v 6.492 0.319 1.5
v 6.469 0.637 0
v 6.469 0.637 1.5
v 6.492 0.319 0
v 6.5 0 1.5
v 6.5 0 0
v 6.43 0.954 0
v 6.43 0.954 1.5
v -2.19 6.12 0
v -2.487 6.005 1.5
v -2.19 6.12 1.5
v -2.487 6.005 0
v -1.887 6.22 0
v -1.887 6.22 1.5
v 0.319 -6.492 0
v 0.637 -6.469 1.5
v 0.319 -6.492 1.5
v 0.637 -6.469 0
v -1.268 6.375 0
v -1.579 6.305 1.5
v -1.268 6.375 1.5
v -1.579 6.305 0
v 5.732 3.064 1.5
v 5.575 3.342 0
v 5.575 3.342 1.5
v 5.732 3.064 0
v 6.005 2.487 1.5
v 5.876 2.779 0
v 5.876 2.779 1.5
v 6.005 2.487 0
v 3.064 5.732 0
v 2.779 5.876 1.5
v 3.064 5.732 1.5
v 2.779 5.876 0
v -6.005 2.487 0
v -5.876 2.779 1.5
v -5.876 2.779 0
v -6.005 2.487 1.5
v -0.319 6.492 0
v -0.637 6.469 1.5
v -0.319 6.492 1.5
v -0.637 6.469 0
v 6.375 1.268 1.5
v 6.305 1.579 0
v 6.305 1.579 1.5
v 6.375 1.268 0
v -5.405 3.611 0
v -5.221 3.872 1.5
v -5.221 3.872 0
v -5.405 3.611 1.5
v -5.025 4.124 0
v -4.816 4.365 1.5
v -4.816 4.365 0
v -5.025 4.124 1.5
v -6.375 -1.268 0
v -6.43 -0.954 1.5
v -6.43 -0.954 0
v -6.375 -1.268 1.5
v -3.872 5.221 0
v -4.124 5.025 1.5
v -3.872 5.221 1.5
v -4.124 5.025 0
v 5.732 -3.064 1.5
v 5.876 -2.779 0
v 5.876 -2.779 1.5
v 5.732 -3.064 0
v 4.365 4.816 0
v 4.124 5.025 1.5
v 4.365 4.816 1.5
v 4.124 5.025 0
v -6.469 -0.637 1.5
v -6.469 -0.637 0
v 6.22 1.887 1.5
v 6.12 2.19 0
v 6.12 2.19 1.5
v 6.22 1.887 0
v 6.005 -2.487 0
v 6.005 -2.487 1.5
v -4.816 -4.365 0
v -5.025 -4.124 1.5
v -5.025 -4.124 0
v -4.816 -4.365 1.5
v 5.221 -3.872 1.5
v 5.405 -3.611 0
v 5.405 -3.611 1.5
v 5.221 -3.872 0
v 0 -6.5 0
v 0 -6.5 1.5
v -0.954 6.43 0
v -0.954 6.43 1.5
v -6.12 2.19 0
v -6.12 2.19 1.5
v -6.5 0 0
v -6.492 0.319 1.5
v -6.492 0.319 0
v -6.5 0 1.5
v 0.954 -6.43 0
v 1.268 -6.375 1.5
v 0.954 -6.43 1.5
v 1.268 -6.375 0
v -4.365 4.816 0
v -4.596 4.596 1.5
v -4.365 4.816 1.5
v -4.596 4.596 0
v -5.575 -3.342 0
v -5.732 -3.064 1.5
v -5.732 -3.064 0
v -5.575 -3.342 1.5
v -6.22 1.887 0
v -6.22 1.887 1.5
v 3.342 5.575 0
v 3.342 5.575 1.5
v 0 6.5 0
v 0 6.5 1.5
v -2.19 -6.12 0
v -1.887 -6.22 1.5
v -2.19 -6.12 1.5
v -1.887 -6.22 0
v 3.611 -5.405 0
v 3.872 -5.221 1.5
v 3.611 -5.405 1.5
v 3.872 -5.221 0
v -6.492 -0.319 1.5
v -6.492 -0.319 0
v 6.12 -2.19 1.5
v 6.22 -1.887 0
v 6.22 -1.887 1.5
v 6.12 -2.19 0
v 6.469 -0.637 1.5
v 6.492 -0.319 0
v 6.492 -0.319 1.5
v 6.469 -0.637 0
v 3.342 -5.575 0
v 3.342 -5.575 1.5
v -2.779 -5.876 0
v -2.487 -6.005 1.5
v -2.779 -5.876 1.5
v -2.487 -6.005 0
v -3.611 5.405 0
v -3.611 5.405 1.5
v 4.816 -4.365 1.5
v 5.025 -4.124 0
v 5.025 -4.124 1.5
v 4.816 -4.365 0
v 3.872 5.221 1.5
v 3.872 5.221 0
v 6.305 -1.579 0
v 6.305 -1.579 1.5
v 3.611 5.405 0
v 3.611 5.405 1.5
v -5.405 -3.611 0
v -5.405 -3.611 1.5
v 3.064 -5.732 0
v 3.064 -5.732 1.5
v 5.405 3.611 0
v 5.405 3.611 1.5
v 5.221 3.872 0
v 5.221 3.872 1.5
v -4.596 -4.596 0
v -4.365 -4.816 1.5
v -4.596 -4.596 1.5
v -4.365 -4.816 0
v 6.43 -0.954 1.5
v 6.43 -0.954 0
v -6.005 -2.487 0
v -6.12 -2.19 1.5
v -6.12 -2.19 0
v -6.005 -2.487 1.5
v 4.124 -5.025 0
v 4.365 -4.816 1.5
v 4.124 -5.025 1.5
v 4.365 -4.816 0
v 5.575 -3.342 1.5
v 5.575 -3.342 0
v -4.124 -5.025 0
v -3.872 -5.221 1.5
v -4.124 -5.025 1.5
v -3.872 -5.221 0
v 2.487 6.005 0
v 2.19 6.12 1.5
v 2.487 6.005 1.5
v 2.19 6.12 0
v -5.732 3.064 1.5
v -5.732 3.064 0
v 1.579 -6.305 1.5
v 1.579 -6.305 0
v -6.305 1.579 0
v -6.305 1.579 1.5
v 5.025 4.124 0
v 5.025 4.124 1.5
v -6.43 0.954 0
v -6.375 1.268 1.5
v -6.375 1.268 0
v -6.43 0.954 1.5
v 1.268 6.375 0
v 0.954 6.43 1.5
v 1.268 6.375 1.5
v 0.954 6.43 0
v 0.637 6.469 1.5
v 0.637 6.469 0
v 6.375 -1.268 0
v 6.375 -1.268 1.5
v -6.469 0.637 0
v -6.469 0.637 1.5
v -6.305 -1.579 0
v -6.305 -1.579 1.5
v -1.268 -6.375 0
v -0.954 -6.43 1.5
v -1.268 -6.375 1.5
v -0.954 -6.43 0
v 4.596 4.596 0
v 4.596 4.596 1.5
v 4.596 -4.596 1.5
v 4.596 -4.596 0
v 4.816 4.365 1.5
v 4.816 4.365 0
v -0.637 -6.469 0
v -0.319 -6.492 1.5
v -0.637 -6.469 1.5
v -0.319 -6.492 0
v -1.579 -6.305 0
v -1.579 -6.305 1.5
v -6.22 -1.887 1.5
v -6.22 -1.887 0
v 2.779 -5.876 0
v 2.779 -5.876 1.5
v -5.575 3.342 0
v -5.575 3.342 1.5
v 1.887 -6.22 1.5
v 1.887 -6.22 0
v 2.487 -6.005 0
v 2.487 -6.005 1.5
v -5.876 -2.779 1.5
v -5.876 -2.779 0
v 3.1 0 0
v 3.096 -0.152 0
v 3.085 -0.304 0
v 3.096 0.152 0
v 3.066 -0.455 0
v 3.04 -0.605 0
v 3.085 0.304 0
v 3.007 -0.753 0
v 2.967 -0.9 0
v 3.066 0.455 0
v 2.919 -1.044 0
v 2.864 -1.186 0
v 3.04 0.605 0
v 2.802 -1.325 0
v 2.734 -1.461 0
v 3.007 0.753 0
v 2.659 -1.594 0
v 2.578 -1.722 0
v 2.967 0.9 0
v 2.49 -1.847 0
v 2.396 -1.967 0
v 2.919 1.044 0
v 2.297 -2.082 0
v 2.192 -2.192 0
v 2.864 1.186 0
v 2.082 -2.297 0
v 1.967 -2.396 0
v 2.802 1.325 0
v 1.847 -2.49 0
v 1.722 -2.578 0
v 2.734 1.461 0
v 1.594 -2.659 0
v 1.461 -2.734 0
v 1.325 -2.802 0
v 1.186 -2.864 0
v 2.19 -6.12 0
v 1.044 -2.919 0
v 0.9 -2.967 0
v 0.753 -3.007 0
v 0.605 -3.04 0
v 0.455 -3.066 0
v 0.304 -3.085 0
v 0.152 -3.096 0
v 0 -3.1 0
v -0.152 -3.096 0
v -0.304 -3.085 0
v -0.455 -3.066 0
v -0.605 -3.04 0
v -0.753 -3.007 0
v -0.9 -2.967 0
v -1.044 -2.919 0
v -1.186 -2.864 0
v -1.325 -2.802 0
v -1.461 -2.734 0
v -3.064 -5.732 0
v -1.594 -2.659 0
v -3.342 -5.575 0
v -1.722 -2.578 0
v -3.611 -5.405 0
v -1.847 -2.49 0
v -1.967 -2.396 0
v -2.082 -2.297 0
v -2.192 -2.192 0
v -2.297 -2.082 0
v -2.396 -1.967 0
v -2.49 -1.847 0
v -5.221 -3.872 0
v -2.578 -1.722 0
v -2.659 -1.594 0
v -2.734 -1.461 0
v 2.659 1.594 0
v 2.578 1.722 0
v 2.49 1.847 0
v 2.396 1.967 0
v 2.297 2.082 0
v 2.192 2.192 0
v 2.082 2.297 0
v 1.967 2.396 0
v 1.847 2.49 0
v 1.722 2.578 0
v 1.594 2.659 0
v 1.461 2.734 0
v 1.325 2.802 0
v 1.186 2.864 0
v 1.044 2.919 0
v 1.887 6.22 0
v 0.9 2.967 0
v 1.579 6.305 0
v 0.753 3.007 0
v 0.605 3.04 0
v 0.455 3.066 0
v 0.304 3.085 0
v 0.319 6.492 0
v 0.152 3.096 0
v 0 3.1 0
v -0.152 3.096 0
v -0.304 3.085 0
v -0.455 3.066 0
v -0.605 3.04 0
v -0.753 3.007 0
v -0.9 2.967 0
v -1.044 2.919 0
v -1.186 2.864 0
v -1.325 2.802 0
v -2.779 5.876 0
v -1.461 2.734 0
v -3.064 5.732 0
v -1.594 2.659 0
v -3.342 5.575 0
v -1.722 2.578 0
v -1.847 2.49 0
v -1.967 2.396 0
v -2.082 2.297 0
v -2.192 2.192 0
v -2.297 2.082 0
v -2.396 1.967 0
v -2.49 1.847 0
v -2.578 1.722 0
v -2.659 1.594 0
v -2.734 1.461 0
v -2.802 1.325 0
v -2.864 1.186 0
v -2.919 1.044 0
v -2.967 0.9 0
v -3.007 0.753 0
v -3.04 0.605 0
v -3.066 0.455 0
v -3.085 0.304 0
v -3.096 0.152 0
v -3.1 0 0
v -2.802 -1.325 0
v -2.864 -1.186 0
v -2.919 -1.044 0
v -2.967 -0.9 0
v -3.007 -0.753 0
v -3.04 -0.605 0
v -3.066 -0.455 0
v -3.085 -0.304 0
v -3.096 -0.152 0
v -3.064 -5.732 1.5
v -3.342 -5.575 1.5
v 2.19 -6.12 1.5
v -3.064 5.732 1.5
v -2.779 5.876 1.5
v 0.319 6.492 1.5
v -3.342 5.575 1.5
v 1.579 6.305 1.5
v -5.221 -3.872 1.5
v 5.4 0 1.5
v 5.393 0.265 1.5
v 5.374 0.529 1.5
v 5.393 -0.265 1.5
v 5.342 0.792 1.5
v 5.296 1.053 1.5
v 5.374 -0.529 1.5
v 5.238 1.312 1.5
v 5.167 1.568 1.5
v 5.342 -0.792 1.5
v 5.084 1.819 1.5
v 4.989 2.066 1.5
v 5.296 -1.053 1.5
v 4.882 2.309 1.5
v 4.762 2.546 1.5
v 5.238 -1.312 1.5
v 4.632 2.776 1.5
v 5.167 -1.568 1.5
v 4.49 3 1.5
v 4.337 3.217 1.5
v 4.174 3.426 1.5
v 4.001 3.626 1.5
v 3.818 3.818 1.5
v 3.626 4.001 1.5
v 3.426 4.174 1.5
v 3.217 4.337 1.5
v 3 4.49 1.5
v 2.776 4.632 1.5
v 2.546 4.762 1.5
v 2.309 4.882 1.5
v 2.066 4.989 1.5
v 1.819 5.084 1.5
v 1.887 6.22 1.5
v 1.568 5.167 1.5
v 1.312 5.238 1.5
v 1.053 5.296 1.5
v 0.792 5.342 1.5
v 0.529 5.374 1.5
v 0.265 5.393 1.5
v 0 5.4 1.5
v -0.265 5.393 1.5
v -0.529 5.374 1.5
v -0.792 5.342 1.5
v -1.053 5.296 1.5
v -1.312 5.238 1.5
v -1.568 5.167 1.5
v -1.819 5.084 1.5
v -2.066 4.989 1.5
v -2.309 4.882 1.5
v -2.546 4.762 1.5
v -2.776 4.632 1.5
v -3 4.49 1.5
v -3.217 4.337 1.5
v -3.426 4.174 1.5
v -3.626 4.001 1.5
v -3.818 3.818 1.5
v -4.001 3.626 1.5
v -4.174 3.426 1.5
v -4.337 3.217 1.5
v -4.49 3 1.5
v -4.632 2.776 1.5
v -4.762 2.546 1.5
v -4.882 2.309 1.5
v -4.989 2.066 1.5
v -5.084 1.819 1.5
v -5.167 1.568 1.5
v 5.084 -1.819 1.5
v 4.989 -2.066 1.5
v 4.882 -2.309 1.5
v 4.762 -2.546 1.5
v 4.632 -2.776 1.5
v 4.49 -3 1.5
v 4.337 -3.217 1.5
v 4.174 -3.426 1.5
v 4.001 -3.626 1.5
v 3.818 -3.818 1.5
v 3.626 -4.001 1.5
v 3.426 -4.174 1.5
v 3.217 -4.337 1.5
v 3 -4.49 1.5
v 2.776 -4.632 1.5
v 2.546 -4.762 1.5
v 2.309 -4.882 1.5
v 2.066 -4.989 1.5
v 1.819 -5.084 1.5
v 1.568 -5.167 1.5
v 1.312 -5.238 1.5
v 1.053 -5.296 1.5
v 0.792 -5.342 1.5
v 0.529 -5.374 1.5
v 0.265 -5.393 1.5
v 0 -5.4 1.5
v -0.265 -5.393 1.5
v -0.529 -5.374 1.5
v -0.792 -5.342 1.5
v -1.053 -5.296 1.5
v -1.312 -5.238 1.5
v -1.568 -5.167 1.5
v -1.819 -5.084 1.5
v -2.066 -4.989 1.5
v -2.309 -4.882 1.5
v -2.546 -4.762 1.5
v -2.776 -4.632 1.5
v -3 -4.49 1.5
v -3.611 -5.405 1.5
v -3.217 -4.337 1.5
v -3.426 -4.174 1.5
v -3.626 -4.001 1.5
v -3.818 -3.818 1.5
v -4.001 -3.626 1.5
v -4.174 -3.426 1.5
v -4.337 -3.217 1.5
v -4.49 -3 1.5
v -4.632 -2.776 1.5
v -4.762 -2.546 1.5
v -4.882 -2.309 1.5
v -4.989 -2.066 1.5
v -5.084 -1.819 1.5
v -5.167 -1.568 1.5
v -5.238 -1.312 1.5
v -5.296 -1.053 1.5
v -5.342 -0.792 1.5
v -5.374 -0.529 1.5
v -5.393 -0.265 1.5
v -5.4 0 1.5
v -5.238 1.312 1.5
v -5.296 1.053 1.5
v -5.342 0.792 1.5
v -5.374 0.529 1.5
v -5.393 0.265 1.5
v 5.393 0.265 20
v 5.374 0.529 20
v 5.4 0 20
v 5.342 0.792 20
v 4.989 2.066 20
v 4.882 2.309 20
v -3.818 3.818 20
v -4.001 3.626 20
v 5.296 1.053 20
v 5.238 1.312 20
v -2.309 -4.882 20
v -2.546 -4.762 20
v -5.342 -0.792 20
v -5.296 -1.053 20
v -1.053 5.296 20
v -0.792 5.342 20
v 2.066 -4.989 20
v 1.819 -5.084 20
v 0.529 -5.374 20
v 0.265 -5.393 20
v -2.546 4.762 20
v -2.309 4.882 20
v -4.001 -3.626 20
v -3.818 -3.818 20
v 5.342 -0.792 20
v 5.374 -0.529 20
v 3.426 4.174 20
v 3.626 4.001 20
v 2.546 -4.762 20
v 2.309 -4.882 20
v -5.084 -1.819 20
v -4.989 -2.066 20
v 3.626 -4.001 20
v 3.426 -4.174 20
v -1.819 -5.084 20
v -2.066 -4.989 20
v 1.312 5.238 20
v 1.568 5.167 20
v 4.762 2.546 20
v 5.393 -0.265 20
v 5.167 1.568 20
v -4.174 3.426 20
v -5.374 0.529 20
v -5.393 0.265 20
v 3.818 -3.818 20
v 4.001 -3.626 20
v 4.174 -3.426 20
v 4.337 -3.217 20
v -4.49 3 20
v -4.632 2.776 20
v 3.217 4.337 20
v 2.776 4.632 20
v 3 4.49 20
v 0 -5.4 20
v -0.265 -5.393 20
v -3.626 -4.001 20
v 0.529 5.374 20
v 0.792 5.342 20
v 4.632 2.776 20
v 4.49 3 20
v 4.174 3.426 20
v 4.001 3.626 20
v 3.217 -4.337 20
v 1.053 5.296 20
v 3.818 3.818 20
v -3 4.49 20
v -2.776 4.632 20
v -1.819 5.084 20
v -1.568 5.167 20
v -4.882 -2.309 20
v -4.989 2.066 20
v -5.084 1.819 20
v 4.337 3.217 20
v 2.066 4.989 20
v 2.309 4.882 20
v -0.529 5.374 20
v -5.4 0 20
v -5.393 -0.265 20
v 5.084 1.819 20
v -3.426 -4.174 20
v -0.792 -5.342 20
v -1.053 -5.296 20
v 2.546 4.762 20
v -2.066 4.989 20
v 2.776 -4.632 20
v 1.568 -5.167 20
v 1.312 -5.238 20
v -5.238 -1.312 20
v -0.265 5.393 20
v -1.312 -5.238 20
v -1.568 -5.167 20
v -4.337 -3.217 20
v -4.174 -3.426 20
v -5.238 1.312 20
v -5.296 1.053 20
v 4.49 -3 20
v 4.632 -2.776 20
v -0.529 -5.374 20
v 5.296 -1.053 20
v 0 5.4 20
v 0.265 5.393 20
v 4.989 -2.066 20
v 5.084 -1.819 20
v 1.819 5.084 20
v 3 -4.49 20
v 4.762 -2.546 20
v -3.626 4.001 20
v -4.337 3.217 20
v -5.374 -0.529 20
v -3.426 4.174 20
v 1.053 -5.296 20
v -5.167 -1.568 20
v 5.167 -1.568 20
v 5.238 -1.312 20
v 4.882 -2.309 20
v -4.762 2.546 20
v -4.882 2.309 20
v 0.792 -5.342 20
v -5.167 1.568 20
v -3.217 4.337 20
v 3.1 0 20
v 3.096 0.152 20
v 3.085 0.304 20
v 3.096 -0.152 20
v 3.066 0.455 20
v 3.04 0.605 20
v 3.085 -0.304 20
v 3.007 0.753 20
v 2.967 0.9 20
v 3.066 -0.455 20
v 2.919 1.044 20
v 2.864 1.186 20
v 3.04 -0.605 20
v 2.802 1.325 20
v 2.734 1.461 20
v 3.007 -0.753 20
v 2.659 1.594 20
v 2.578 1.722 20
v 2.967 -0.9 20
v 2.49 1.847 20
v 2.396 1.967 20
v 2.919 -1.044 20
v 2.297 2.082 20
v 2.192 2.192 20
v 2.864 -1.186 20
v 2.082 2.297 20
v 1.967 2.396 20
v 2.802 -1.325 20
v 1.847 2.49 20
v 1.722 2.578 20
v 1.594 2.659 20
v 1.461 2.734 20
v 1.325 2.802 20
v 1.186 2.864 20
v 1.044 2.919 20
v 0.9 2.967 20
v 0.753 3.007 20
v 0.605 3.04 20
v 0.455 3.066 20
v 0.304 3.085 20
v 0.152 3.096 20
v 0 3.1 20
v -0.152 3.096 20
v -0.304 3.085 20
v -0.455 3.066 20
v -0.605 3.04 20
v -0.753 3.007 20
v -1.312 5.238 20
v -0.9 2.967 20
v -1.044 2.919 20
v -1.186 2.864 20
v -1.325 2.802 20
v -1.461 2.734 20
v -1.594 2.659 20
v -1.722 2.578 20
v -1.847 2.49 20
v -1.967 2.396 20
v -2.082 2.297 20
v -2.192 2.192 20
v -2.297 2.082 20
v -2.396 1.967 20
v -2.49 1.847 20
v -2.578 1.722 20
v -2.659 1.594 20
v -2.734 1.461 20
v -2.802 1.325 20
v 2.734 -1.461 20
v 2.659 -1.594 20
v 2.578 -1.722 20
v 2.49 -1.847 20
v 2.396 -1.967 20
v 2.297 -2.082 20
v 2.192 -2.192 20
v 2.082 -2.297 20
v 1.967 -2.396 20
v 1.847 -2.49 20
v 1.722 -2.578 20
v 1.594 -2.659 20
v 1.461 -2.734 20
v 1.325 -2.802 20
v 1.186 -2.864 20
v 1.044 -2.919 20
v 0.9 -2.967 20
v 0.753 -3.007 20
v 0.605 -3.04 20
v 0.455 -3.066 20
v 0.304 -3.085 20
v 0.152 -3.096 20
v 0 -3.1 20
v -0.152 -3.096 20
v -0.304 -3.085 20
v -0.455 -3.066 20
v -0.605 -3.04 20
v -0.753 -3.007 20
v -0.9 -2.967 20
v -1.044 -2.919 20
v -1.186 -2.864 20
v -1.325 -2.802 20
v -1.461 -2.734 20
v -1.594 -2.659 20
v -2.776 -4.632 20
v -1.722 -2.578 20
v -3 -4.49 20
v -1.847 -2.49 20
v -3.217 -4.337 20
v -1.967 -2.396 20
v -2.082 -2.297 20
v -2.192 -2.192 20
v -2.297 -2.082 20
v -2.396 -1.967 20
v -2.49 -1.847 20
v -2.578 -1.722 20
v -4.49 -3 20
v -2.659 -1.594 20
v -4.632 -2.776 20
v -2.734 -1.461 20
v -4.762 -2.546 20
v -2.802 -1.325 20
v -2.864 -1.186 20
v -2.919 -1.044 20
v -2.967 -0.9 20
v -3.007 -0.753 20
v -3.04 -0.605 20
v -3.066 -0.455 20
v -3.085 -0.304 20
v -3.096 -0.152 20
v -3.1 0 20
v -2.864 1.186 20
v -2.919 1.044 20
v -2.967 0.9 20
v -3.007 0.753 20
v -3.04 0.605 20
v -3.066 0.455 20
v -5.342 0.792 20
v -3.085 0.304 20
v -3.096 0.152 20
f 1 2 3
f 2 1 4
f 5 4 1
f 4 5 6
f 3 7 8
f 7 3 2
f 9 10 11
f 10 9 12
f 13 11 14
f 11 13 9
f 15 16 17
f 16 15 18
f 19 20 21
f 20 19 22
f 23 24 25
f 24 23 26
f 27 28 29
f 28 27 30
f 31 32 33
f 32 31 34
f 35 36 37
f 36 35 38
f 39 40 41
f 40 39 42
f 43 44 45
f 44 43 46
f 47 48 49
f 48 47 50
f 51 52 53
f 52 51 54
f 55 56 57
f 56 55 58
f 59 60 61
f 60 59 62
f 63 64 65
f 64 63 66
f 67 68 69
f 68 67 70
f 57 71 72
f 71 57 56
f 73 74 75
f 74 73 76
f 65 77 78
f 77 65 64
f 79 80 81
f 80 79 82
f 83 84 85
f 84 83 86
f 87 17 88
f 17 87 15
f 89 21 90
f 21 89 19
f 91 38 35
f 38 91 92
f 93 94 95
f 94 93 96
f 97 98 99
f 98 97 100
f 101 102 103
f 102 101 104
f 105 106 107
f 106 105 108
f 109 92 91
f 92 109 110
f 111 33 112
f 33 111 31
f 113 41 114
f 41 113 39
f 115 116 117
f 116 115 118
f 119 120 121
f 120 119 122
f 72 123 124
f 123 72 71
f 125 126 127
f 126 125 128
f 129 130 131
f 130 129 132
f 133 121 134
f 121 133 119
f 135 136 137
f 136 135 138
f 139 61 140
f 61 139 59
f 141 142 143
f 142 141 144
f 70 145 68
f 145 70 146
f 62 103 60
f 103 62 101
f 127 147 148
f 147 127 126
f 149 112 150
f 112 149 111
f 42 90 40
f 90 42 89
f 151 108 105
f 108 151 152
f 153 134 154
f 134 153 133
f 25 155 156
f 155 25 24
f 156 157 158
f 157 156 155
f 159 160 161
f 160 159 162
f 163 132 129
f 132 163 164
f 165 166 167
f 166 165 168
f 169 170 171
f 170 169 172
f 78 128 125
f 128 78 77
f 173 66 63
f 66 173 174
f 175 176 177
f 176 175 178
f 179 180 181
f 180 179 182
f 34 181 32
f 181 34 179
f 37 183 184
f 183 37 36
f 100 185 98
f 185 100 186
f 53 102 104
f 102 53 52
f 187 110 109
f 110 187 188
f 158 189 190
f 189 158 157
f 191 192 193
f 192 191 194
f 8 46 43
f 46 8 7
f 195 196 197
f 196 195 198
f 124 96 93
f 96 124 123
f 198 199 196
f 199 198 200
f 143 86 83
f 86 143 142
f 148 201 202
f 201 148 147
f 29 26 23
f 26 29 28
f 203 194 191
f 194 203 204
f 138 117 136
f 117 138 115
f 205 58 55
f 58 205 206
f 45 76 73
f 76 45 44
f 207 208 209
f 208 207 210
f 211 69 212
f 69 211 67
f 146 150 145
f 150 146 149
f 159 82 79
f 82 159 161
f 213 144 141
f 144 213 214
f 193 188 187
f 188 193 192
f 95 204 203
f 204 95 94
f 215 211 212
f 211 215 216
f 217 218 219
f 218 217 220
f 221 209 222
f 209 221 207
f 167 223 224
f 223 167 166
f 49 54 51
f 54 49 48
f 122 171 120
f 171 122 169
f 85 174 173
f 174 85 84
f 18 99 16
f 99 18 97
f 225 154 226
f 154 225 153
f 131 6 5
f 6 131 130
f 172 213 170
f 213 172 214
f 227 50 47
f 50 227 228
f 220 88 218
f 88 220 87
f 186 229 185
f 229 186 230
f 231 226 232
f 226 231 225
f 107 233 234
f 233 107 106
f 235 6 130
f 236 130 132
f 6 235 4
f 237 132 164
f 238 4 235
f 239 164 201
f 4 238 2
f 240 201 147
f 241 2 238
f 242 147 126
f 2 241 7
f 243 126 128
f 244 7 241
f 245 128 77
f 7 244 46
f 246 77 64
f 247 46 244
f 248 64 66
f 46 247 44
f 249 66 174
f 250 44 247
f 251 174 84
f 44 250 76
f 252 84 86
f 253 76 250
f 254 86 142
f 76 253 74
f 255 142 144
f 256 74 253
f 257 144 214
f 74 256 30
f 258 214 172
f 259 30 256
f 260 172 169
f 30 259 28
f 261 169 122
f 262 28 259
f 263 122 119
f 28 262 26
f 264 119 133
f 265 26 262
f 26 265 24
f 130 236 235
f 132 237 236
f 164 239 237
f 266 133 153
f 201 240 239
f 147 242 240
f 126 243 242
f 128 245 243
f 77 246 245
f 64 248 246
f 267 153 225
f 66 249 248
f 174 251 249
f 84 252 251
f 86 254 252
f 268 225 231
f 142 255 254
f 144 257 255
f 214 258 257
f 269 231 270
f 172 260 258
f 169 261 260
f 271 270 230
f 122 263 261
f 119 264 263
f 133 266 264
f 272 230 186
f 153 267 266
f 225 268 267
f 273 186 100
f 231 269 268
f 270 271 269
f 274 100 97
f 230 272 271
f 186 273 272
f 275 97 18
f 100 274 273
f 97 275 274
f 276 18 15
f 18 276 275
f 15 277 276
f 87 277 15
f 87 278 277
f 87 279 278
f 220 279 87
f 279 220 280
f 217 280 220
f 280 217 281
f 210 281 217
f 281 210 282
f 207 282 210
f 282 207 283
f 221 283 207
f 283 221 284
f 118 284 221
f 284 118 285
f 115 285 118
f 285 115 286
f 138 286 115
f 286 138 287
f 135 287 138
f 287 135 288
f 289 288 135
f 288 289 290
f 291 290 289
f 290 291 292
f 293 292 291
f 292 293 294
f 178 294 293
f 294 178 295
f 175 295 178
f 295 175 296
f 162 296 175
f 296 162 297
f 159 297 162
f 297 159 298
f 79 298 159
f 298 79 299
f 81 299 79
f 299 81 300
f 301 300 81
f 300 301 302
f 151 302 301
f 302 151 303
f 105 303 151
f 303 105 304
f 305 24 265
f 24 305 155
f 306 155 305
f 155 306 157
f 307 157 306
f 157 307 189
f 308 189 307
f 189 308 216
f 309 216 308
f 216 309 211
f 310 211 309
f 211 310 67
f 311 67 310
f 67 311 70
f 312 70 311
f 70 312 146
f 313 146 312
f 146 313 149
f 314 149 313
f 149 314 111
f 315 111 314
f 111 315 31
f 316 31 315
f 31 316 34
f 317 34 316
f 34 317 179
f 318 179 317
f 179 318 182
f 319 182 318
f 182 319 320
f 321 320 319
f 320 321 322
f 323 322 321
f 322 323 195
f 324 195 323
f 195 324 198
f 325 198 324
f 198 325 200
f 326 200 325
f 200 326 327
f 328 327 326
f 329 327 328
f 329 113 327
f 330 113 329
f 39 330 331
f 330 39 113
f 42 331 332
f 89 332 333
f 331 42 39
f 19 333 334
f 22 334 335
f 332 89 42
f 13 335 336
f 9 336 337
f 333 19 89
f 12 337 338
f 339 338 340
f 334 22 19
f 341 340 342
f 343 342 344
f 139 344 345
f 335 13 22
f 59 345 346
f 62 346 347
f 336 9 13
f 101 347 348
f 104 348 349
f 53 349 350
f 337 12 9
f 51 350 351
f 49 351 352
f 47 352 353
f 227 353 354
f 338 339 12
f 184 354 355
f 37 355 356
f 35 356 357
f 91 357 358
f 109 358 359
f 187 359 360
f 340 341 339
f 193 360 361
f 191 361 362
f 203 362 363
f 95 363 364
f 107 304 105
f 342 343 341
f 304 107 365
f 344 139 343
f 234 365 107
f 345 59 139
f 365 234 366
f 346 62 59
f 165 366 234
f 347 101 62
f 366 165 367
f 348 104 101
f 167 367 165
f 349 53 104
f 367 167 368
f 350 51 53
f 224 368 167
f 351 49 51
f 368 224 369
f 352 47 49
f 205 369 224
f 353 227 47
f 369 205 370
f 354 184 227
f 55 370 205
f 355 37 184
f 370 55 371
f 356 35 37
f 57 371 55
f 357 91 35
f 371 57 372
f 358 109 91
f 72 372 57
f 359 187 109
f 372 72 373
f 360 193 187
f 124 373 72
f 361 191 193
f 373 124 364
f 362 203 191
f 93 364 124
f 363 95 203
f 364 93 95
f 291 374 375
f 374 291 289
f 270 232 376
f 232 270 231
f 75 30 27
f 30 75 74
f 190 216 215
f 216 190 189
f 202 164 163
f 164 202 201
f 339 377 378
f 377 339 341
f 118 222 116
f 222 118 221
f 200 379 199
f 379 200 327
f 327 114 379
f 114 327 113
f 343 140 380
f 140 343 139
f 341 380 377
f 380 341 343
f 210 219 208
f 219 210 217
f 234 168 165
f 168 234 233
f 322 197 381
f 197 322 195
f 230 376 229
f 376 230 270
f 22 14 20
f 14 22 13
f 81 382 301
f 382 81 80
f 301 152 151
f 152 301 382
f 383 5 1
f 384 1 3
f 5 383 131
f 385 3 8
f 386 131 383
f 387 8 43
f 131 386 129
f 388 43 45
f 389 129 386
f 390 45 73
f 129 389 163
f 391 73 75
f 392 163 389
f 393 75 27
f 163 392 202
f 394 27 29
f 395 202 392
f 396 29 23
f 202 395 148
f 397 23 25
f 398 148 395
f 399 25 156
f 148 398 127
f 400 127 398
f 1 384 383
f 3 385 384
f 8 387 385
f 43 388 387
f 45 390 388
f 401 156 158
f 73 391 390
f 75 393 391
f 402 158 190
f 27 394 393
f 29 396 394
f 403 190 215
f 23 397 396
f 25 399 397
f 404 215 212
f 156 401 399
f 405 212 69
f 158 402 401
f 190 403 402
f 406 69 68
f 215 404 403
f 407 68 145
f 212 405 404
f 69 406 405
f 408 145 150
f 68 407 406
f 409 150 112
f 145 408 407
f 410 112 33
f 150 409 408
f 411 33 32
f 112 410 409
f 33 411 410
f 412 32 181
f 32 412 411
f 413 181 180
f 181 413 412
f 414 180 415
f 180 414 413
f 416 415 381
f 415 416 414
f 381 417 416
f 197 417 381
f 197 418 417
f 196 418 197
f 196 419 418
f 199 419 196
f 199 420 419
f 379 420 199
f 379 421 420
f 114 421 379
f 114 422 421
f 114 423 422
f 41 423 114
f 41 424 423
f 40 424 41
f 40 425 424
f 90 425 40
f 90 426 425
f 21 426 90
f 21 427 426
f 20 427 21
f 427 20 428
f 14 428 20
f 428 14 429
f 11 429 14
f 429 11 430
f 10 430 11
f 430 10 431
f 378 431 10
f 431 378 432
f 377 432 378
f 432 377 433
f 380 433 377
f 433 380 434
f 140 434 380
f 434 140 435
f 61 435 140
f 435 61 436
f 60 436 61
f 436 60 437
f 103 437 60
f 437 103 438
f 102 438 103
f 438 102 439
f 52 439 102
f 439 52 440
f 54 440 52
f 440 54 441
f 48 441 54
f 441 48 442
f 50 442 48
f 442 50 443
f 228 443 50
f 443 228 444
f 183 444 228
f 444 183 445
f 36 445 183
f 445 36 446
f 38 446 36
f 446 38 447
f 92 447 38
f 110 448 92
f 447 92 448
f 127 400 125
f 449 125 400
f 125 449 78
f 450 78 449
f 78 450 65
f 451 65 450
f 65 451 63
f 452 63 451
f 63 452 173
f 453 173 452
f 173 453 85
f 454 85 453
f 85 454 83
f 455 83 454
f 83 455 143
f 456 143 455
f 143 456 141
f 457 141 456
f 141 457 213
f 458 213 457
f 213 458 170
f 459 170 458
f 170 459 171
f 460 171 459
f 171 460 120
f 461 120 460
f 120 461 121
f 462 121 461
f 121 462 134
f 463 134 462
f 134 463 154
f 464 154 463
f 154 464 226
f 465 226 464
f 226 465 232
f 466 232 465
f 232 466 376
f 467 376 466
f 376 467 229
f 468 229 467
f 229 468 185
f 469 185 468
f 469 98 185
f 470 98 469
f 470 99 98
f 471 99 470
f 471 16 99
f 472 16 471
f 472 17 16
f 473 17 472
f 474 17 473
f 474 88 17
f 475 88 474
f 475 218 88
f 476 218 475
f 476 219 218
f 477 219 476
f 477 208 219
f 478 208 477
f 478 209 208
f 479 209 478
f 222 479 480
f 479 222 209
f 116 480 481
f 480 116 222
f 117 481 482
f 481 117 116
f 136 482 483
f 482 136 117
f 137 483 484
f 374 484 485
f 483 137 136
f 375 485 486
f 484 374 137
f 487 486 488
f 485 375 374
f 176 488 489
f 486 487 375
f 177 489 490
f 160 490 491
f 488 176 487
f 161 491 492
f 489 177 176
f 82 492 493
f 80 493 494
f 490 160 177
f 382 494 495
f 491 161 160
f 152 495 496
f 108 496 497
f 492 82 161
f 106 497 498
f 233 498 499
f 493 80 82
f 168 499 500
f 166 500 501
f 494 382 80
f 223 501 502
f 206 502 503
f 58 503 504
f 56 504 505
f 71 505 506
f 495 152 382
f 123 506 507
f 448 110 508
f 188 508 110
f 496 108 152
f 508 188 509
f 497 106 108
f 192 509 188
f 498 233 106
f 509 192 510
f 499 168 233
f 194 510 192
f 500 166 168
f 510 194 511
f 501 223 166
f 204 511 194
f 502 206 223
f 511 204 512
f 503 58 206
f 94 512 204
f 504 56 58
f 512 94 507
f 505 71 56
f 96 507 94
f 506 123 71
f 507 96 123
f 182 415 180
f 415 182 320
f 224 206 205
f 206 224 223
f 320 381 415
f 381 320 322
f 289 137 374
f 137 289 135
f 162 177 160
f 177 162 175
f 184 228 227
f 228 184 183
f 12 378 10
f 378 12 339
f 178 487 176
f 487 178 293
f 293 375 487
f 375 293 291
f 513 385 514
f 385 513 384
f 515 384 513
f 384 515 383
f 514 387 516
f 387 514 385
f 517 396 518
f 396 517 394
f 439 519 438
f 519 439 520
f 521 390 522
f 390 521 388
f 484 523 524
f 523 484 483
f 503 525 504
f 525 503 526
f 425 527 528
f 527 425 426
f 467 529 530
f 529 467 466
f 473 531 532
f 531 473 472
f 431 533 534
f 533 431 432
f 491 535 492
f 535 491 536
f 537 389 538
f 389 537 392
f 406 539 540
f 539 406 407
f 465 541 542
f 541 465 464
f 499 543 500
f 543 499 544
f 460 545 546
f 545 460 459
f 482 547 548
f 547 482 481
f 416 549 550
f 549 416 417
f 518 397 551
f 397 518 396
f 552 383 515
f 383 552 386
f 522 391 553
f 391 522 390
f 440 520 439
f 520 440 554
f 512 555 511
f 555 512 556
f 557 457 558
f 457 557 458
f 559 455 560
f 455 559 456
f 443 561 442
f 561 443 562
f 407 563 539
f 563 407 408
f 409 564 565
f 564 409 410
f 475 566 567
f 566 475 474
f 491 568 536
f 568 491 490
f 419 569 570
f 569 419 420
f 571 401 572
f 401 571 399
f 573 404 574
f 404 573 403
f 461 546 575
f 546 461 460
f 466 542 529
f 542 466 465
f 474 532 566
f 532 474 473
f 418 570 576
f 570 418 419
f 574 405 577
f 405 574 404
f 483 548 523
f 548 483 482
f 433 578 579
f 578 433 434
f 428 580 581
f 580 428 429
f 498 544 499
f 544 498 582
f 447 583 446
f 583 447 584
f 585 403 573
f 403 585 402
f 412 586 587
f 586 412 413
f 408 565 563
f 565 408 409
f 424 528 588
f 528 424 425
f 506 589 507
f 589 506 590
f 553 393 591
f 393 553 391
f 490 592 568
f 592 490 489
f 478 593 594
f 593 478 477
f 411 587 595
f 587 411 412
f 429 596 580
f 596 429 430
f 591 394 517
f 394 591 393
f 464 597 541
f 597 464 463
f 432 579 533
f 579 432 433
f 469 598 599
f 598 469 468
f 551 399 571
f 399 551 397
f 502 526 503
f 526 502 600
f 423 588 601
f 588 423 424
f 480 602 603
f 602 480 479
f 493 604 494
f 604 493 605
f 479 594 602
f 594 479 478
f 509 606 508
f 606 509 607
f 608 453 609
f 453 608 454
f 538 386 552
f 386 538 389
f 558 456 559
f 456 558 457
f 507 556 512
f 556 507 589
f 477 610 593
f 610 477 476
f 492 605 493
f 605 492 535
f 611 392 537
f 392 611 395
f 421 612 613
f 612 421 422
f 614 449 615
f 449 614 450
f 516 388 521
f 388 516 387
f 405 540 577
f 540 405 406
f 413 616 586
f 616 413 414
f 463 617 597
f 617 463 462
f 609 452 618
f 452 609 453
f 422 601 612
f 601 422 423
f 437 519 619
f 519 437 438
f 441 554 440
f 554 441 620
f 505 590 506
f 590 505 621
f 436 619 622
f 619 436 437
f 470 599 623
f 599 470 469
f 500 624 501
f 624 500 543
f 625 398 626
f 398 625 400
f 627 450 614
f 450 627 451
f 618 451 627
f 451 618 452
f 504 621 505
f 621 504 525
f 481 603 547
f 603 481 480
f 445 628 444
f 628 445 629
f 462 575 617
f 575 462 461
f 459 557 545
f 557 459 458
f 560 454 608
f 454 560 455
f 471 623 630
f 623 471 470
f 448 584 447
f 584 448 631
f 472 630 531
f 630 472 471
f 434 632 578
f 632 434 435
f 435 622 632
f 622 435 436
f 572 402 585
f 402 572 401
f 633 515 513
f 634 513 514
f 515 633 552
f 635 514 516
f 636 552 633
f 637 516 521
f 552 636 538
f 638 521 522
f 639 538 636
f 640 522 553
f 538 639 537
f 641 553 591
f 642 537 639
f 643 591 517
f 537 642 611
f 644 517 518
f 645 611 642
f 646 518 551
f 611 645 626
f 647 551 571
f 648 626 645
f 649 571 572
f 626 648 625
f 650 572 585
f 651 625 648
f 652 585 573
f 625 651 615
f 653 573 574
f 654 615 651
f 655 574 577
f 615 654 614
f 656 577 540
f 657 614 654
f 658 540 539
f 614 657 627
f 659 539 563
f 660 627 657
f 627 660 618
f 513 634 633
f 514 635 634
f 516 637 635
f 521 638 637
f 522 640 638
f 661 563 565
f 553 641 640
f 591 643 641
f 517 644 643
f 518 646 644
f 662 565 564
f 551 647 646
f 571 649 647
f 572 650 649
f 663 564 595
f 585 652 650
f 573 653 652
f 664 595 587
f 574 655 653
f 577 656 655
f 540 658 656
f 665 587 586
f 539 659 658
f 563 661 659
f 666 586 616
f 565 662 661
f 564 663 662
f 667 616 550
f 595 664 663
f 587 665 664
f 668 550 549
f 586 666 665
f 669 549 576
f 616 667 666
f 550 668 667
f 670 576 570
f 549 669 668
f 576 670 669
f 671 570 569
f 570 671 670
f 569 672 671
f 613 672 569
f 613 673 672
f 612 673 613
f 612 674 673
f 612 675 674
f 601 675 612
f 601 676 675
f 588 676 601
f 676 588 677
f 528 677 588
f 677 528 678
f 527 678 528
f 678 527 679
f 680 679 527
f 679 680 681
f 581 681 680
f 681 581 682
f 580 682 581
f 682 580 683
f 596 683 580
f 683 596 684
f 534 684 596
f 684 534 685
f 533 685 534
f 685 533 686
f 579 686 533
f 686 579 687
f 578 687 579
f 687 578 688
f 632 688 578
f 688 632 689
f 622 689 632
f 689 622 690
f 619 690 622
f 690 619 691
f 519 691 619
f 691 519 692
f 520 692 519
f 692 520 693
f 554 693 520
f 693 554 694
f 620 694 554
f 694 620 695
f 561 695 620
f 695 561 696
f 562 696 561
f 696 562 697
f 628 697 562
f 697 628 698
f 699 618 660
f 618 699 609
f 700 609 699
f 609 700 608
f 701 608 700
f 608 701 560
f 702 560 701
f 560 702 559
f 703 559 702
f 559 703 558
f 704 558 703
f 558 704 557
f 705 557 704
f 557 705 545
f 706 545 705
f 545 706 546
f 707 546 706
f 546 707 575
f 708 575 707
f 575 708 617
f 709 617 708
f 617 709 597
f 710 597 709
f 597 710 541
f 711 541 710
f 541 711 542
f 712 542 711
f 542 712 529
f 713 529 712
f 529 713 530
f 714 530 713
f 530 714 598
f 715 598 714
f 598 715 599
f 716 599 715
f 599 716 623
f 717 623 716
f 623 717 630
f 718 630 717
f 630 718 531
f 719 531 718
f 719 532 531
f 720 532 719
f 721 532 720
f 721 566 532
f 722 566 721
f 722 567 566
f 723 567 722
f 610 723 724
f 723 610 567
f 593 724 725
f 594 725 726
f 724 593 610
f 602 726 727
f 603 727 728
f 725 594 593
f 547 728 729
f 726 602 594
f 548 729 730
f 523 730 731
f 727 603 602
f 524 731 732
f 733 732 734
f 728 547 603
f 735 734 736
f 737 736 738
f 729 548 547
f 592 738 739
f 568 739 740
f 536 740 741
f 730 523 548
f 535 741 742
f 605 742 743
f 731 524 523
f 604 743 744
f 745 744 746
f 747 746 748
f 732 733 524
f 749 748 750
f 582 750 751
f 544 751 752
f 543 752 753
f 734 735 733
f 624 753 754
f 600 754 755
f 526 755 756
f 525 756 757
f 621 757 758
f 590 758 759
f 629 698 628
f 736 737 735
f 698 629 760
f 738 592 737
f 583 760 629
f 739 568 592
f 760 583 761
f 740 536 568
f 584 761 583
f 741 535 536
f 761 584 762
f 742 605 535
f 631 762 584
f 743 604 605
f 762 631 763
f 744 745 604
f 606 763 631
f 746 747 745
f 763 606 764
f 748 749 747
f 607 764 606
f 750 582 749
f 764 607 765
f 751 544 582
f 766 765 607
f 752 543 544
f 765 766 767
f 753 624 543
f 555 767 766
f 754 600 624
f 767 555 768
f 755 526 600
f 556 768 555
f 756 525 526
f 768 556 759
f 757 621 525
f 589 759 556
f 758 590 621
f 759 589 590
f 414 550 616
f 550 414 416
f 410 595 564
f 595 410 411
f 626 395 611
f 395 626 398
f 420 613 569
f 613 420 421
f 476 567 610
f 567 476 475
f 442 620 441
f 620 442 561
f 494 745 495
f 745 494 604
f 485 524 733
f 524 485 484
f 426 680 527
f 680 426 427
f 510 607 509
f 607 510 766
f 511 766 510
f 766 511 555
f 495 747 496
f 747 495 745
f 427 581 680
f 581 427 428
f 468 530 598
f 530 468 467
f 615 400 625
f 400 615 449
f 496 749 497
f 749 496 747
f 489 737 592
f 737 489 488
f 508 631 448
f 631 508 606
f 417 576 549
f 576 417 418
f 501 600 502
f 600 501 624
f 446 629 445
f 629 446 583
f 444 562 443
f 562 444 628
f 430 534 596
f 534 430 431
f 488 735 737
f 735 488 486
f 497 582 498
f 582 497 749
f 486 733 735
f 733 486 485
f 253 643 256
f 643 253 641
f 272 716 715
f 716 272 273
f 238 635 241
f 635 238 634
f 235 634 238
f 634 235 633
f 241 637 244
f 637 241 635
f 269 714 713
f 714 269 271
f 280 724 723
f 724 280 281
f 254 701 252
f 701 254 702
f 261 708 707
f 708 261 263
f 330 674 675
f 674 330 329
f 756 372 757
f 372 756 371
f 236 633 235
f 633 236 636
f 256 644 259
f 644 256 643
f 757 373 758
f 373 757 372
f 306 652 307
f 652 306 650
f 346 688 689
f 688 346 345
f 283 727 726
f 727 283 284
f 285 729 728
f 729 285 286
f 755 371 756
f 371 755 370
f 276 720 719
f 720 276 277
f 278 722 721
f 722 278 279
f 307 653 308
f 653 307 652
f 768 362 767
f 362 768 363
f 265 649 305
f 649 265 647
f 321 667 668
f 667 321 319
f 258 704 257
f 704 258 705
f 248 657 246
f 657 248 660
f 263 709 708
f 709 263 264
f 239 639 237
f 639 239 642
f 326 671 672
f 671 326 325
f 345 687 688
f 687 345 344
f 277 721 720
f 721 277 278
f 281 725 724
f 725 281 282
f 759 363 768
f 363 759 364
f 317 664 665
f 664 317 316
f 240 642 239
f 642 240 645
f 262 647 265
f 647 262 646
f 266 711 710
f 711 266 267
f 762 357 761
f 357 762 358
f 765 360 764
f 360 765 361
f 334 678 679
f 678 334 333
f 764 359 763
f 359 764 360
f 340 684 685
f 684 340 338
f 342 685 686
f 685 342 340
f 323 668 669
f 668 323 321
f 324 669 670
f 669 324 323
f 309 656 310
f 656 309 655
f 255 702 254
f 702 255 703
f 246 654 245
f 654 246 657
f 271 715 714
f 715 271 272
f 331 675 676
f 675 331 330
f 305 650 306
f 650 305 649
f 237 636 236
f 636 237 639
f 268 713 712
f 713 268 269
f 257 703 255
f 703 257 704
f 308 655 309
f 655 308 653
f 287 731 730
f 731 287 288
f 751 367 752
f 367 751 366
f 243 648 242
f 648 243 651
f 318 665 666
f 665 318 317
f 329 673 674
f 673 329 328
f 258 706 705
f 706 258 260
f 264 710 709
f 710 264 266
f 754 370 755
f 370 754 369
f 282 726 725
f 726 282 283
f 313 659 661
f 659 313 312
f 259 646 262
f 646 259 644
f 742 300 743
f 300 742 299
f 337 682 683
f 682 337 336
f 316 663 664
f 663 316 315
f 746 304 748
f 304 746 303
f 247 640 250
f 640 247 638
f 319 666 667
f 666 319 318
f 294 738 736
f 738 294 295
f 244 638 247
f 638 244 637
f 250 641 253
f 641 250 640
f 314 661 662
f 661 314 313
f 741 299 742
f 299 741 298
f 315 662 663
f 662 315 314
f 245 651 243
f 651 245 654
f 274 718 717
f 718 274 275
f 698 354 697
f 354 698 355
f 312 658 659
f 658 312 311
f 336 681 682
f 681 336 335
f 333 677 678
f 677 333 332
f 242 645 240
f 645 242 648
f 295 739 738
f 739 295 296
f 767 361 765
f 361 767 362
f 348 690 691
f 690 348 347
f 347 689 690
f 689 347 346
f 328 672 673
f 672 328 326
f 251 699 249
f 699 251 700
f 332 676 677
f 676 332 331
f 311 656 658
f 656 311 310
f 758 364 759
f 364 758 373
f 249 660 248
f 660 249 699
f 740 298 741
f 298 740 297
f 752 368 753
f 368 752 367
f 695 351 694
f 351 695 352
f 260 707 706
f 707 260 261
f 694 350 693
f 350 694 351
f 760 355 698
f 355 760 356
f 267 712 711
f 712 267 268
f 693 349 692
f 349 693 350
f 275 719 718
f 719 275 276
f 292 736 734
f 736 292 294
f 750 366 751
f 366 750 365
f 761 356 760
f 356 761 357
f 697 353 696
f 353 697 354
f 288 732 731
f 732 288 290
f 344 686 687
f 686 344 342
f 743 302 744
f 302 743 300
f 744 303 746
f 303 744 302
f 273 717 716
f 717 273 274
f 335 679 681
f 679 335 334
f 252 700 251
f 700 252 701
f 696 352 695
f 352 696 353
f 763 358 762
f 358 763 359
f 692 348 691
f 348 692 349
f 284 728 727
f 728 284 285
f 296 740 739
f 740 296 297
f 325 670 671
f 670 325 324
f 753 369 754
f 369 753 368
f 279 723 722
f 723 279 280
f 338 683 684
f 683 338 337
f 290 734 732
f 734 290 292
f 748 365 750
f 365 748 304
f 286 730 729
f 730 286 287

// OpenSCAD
// Adapter sleeve for 0.2 mL PCR tube in 1.5 mL rack
// Print orientation: Upside down (Collar on bed)
// Units: mm

// --- Dimensions ---
$fn = 128; // High resolution for smooth curves

// Collar dimensions (Bottom, on bed)
$collar_diameter = 13;
$collar_thickness = 1.5;

// Sleeve body dimensions (Rising from collar)
$sleeve_outer_diameter = 10.8;
$sleeve_total_height = 21.5;

// Bore dimensions
$bore_diameter = 6.2;

// --- Calculations ---
// Total height of the part
$part_total_height = $collar_thickness + ($sleeve_total_height - $collar_thickness);

// Outer radius of the collar
$r_collar = $collar_diameter / 2;

// Outer radius of the sleeve body
$r_sleeve = $sleeve_outer_diameter / 2;

// Bore radius
$r_bore = $bore_diameter / 2;

// --- Geometry Construction ---

difference() {
    // 1. The Main Body (Collar + Sleeve)
    union() {
        // Collar (at Z = 0)
        cylinder(
            h = $collar_thickness,
            r = $r_collar,
            center = [0, 0, $collar_thickness / 2],
            $fn = $fn
        );
        
        // Sleeve Body (starts at Z = $collar_thickness)
        cylinder(
            h = $sleeve_total_height - $collar_thickness,
            r = $r_sleeve,
            center = [0, 0, $collar_thickness + ($sleeve_total_height - $collar_thickness) / 2],
            $fn = $fn
        );
    }
    
    // 2. The Bore (Hole through the center)
    // Extends slightly past the top and bottom faces to ensure clean cut
    cylinder(
        h = $part_total_height + 0.1,
        r = $r_bore,
        center = [0, 0, $part_total_height / 2],
        $fn = $fn
    );
}
